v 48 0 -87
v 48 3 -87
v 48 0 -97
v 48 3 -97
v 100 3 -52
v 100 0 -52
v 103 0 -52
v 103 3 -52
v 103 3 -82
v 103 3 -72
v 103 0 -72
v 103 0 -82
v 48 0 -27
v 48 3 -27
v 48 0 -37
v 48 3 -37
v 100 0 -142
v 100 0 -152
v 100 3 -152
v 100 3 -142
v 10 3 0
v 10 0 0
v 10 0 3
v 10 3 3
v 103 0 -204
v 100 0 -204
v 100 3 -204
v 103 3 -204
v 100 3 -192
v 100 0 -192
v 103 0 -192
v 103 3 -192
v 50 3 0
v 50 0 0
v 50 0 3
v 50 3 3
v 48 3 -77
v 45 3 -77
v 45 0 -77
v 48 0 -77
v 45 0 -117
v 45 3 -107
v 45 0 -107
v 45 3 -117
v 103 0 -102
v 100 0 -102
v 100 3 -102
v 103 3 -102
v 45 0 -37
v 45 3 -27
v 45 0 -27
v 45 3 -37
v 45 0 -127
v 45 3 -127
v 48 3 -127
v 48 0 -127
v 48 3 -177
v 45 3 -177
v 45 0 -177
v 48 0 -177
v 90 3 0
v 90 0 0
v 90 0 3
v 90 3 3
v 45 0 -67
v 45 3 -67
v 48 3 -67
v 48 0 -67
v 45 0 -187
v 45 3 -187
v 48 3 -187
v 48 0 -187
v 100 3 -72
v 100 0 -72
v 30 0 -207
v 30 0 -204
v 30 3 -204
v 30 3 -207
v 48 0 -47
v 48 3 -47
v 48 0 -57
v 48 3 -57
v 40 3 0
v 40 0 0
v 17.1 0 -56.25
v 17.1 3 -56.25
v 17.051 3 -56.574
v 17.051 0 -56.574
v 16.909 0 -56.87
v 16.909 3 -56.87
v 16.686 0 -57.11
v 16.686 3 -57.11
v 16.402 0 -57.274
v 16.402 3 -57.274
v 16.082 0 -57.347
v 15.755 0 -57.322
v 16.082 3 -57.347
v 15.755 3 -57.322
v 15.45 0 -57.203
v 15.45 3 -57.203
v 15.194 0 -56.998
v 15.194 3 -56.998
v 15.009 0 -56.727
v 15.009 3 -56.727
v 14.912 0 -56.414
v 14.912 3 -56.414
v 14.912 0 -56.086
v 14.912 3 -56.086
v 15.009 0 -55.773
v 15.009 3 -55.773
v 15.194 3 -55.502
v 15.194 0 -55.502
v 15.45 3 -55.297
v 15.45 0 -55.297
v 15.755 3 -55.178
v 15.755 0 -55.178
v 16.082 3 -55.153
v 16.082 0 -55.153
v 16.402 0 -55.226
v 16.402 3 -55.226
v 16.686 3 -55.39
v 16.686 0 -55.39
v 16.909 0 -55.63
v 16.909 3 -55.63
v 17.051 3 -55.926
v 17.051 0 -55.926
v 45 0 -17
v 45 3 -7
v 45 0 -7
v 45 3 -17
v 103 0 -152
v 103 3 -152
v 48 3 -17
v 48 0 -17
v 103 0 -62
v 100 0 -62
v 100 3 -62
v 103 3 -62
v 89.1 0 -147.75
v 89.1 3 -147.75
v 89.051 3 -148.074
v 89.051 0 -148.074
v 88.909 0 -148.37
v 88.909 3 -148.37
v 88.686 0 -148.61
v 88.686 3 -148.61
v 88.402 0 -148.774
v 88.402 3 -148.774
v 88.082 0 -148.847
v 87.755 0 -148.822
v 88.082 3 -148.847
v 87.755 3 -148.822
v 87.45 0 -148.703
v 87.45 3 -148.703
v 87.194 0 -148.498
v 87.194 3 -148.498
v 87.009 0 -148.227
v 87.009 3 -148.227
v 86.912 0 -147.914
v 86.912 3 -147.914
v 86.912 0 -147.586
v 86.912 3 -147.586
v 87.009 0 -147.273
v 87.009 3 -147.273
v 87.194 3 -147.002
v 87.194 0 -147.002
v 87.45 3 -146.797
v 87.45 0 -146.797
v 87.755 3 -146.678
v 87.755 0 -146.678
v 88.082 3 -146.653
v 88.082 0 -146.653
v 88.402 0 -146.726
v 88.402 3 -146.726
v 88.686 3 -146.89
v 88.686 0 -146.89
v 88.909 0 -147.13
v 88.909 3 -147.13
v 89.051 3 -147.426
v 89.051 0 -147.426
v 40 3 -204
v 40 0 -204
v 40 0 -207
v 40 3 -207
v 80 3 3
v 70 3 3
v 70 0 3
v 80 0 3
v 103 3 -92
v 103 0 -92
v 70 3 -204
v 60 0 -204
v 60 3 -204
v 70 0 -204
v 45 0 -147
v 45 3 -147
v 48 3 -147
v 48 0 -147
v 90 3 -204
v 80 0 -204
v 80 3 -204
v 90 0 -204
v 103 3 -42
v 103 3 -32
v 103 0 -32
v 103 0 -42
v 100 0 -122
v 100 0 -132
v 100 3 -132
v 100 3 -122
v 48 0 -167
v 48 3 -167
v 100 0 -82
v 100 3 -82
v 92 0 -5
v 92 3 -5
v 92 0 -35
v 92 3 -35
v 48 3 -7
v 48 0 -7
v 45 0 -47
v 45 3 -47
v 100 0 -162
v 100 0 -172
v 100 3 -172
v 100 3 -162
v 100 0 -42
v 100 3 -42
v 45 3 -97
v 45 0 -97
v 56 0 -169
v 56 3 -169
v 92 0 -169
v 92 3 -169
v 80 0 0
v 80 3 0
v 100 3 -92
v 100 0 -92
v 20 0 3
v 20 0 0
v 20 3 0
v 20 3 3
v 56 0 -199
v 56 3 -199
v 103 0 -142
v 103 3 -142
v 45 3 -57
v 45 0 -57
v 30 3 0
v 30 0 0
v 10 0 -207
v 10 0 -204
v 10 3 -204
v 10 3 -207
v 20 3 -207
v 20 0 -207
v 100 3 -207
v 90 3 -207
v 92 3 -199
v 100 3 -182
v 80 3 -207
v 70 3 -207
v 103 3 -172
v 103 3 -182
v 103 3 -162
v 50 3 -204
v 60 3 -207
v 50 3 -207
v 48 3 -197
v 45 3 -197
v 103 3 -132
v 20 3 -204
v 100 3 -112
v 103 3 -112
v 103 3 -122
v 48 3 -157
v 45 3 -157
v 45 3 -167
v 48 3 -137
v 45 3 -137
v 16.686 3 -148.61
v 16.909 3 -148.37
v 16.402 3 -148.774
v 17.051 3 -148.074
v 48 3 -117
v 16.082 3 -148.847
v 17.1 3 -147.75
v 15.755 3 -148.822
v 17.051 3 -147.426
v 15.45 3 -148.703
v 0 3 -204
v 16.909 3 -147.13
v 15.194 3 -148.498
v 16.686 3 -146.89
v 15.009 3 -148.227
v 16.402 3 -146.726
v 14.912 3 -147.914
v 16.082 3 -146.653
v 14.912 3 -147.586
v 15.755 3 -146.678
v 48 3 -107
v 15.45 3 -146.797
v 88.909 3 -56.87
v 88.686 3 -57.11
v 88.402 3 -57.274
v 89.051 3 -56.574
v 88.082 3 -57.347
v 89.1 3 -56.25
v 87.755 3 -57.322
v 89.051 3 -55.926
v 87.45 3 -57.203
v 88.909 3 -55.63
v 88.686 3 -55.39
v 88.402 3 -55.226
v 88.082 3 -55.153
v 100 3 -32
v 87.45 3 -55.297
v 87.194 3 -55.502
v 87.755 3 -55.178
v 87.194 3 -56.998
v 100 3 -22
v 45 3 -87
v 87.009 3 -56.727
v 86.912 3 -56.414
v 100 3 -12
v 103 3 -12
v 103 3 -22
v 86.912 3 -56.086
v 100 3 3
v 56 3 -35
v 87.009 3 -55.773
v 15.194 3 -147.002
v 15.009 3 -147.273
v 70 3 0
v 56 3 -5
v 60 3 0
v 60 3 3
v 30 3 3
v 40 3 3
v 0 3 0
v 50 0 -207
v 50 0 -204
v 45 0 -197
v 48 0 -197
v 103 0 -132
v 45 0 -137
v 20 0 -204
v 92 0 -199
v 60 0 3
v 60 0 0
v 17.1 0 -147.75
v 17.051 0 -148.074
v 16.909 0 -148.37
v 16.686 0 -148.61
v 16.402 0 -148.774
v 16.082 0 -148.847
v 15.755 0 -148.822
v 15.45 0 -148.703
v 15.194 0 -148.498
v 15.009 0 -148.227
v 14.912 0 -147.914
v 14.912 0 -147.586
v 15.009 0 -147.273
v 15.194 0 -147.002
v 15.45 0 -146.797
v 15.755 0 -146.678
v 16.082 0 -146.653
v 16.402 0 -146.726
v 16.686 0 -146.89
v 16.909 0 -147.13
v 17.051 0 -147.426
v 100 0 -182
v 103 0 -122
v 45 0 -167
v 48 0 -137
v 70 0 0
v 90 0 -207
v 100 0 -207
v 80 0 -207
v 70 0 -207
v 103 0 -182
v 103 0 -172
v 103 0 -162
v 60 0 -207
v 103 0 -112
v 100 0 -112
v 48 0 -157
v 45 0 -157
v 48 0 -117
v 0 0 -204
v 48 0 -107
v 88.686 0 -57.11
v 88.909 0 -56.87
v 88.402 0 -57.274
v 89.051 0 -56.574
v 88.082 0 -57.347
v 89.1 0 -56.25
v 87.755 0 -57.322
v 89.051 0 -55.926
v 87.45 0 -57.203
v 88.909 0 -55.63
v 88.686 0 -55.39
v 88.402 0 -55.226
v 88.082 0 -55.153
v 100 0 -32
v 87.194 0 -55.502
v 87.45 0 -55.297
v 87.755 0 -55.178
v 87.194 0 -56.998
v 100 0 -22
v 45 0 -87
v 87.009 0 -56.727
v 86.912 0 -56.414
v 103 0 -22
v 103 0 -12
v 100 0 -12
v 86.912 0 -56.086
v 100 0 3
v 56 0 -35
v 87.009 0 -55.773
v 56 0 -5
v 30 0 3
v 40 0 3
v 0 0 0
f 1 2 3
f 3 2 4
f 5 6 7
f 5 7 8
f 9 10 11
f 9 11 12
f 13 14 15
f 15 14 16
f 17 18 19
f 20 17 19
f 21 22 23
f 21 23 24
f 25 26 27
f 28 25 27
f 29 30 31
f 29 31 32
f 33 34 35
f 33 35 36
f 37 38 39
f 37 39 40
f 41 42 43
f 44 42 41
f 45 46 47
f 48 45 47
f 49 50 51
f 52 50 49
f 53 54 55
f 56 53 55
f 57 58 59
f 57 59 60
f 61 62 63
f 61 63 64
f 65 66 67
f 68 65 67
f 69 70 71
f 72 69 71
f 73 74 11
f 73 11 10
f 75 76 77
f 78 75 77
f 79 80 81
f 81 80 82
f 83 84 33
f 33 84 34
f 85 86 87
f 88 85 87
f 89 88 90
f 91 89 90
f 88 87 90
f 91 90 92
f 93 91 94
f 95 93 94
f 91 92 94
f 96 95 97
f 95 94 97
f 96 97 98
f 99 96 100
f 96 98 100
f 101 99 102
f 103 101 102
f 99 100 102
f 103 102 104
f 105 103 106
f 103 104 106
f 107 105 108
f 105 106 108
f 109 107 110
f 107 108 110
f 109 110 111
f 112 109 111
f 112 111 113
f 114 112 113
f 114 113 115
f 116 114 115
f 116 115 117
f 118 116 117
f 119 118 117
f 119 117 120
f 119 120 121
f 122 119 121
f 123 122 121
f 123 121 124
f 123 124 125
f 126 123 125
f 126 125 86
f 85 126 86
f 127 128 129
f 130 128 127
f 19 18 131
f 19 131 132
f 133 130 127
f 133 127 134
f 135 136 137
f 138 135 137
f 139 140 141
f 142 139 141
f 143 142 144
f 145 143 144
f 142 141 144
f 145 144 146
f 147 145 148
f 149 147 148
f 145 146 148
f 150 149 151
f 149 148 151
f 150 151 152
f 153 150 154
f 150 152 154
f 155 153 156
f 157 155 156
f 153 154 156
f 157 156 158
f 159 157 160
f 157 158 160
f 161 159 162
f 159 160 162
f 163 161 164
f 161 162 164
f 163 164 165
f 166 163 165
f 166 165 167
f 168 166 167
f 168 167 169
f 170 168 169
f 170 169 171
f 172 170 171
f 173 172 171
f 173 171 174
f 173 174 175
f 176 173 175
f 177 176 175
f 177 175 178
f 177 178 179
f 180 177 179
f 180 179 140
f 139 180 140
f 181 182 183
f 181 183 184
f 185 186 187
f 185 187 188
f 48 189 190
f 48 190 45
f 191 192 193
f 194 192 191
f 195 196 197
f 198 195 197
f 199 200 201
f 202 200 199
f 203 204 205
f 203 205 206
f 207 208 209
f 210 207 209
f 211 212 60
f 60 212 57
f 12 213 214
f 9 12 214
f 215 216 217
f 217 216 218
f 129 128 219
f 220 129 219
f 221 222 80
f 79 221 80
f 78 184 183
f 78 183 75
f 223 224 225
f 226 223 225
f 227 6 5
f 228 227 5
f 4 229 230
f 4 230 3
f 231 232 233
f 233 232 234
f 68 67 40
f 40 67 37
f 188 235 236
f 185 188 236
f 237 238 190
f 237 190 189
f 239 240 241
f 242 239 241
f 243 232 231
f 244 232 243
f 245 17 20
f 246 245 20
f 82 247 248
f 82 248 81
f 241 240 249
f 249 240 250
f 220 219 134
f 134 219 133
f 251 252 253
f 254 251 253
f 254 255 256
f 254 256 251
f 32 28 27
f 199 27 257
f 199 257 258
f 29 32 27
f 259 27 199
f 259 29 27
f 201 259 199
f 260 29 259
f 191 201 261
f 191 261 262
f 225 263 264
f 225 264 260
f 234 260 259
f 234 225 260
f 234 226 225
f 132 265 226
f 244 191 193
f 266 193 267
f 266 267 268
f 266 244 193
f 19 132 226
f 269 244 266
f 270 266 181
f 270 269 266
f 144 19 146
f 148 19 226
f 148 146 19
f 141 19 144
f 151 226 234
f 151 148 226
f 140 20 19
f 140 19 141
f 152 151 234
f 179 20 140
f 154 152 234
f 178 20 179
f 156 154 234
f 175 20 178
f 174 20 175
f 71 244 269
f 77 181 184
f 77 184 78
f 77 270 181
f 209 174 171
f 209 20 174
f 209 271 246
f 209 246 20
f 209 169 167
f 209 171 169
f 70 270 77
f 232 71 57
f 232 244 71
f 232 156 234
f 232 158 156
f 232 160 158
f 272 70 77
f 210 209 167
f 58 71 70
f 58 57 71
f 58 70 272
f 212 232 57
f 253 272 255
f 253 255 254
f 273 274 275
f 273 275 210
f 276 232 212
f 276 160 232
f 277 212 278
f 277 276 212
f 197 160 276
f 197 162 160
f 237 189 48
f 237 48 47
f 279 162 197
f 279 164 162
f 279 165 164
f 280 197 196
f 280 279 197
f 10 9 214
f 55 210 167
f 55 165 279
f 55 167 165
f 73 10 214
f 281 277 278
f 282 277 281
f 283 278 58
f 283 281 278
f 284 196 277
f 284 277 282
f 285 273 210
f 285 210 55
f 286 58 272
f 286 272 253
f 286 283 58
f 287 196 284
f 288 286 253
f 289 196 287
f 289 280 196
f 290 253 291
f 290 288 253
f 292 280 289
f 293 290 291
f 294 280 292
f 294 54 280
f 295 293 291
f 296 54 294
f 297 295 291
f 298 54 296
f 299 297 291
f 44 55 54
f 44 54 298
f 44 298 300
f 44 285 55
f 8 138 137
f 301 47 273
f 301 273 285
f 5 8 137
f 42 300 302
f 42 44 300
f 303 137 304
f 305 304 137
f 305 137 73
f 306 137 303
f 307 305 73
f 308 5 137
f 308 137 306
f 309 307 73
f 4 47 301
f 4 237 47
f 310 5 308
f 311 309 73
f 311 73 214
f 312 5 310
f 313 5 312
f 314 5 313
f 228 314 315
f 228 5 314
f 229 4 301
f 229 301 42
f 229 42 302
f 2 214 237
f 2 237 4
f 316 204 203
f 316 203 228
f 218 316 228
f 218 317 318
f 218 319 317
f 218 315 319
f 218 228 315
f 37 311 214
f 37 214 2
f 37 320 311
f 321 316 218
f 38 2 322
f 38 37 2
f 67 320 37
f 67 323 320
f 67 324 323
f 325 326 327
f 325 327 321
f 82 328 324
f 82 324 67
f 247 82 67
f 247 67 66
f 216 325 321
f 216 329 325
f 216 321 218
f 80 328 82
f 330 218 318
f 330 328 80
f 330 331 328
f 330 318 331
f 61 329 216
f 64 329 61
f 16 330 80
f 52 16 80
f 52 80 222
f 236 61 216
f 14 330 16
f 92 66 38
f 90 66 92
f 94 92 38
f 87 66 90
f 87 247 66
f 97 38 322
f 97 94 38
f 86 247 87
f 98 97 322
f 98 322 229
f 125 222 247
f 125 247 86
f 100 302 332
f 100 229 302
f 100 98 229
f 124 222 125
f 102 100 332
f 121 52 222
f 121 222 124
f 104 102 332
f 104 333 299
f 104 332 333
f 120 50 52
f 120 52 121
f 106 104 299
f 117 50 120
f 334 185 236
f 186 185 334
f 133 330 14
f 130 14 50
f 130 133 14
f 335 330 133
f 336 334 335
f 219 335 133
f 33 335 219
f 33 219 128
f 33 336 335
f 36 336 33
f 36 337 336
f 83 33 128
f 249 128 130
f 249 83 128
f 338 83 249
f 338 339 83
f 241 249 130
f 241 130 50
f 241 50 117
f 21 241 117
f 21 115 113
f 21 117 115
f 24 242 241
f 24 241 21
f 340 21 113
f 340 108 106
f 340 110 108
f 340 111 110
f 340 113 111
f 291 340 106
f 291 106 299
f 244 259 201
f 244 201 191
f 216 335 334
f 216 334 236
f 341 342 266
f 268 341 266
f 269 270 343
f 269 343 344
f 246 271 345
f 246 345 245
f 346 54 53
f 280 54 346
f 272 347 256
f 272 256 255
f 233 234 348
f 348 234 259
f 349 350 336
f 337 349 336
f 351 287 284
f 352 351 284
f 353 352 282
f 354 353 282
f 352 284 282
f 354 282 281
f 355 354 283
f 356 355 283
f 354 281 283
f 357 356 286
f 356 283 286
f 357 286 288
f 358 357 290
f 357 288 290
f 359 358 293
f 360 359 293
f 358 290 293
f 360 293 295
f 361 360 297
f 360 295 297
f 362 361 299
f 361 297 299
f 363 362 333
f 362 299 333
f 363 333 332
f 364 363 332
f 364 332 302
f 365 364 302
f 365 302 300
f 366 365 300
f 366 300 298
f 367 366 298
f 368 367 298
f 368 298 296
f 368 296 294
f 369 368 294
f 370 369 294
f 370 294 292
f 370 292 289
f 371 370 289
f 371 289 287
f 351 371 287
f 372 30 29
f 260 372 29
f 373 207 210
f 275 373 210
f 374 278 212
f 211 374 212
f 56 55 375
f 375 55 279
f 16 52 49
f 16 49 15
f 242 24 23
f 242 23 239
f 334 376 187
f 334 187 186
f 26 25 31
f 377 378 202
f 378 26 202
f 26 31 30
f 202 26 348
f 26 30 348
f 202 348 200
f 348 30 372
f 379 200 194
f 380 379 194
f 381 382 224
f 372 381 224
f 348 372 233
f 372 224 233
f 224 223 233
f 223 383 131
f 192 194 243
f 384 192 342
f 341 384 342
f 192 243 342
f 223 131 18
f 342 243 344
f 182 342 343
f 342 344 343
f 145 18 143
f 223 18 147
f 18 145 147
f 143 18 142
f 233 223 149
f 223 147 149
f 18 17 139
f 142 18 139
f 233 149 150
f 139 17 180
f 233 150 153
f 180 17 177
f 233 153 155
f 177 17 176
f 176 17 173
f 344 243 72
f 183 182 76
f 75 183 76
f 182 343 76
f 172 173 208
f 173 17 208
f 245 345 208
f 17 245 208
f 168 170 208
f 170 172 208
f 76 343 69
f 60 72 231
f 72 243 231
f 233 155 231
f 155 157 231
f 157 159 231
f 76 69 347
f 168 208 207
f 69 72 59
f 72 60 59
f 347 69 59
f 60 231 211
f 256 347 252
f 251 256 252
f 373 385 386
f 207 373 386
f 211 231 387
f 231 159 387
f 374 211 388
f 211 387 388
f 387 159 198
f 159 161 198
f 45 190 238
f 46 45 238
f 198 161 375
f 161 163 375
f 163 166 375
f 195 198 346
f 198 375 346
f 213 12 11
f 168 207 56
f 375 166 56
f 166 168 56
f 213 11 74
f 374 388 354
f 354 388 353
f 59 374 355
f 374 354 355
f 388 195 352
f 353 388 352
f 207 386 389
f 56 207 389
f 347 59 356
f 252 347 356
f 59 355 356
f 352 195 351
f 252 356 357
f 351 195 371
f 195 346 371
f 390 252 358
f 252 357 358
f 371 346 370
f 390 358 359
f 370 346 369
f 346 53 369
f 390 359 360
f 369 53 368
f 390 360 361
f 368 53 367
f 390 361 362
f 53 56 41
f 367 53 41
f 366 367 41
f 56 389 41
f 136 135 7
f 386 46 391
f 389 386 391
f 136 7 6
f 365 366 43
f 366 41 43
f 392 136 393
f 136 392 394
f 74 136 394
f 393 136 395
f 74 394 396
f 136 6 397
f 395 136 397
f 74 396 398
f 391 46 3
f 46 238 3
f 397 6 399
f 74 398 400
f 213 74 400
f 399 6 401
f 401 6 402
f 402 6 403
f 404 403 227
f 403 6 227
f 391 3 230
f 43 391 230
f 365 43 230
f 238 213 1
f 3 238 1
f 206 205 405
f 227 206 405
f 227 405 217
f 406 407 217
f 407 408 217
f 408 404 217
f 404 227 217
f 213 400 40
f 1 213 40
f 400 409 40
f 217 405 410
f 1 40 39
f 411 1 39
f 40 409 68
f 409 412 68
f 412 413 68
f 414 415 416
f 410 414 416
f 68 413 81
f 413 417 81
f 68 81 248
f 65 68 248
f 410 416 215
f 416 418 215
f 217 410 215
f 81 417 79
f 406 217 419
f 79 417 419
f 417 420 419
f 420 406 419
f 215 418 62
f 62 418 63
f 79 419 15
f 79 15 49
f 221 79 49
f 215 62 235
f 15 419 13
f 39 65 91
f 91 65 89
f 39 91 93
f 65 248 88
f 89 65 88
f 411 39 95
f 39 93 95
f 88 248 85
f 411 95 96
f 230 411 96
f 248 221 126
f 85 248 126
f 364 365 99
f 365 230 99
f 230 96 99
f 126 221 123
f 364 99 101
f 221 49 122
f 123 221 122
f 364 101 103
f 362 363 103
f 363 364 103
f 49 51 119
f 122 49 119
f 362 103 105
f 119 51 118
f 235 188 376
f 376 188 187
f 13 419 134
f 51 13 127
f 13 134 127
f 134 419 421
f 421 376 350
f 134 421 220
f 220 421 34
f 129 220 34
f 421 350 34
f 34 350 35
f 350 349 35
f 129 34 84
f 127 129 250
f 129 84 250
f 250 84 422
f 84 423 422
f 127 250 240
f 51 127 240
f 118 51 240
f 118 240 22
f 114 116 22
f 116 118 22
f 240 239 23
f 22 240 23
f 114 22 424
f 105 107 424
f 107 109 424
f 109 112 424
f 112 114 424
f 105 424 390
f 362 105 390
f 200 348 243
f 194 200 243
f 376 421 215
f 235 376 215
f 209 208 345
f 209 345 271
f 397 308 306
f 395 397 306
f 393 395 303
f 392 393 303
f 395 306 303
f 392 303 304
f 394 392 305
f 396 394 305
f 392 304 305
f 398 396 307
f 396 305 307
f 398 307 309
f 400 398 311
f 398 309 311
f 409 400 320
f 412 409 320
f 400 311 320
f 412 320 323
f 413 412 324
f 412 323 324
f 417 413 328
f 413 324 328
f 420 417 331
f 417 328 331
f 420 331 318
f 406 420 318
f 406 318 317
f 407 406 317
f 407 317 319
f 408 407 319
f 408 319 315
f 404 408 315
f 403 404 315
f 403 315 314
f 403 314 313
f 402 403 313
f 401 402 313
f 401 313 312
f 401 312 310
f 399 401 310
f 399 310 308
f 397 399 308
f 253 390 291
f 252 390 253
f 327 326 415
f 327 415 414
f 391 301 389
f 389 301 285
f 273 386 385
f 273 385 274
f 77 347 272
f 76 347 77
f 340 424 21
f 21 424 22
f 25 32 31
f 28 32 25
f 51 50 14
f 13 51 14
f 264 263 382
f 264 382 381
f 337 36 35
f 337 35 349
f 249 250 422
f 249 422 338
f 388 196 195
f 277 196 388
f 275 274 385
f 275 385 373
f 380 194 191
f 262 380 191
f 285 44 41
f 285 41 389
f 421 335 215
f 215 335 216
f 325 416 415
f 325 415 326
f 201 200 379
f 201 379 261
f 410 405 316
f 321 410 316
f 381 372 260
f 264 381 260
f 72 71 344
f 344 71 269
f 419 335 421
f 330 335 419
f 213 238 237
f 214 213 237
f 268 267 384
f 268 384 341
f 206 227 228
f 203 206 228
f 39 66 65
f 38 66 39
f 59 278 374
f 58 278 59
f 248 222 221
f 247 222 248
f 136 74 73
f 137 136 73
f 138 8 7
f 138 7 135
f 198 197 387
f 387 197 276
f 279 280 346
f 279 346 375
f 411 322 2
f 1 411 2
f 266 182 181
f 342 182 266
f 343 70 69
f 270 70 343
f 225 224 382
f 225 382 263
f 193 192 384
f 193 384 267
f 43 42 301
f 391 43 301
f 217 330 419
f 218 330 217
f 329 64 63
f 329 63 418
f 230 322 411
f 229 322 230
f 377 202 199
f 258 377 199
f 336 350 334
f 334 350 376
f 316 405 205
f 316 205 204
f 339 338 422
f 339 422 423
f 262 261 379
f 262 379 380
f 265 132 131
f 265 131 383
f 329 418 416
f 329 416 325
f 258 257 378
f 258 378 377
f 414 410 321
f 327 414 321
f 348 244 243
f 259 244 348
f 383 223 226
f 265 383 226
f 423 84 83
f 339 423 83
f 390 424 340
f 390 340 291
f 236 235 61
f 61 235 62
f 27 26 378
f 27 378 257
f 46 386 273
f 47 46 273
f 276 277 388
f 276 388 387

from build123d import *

# Parameters (mm, degrees)
SKETCH1_W           = 100
SKETCH1_H           = 204
BOSS_EXTRUDE1_DEPTH = 3
SKETCH2_W           = 10
SKETCH2_H           = 3
BOSS_EXTRUDE2_DEPTH = 3
LPATTERN1_COUNT     = 5
LPATTERN1_PITCH     = 20
SKETCH3_W           = 10
SKETCH3_H           = 3
BOSS_EXTRUDE3_DEPTH = 3
LPATTERN2_COUNT     = 5
LPATTERN2_PITCH     = 20
SKETCH4_W           = 3
SKETCH4_H           = 10
CUT_EXTRUDE1_DEPTH  = 4
LPATTERN3_COUNT     = 10
LPATTERN3_PITCH     = 20
SKETCH5_R           = 1.1
SKETCH5_W           = 36
SKETCH5_H           = 30
CUT_EXTRUDE2_DEPTH  = 4
SKETCH6_W           = 12
SKETCH6_H           = 3
SKETCH6_W_2         = 10
BOSS_EXTRUDE4_DEPTH = 3


with BuildPart() as part:
    # Sketch1 → Boss-Extrude1 (new body)
    with BuildSketch(Plane(origin=(0, 0, 0), x_dir=(1, 0, 0), z_dir=(0, 1, 0))):
        with Locations((50, 102)):
            Rectangle(SKETCH1_W, SKETCH1_H)
    extrude(amount=BOSS_EXTRUDE1_DEPTH)

    # Sketch2 → Boss-Extrude2 (add)
    with BuildSketch(Plane.XY):
        with Locations((95, 1.5)):
            Rectangle(SKETCH2_W, SKETCH2_H)
    boss_extrude2 = extrude(amount=BOSS_EXTRUDE2_DEPTH)

    # LPattern1: Boss-Extrude2 ×5
    with Locations(*[(-i * LPATTERN1_PITCH, 0, 0) for i in range(1, LPATTERN1_COUNT)]):
        add(boss_extrude2)

    # Sketch3 → Boss-Extrude3 (add)
    with BuildSketch(Plane(origin=(0, 0, -204), x_dir=(-1, 0, 0), z_dir=(0, 0, -1))):
        with Locations((-95, 1.5)):
            Rectangle(SKETCH3_W, SKETCH3_H)
    boss_extrude3 = extrude(amount=BOSS_EXTRUDE3_DEPTH)

    # LPattern2: Boss-Extrude3 ×5
    with Locations(*[(-i * LPATTERN2_PITCH, 0, 0) for i in range(1, LPATTERN2_COUNT)]):
        add(boss_extrude3)

    # Sketch4 → Cut-Extrude1 (cut, through all)
    with BuildSketch(Plane(origin=(0, 3, 0), x_dir=(1, 0, 0), z_dir=(0, 1, 0))):
        with Locations((46.5, 12)):
            Rectangle(SKETCH4_W, SKETCH4_H)
    cut_extrude1 = extrude(amount=-CUT_EXTRUDE1_DEPTH, mode=Mode.SUBTRACT)

    # LPattern3: Cut-Extrude1 ×10
    with Locations(*[(0, 0, -i * LPATTERN3_PITCH) for i in range(1, LPATTERN3_COUNT)]):
        add(cut_extrude1, mode=Mode.SUBTRACT)

    # Sketch5 → Cut-Extrude2 (cut, through all)
    with BuildSketch(Plane(origin=(0, 3, 0), x_dir=(1, 0, 0), z_dir=(0, 1, 0))):
        with Locations((88, 147.75)):
            Circle(SKETCH5_R)
        with Locations((88, 56.25)):
            Circle(SKETCH5_R)
        with Locations((16, 56.25)):
            Circle(SKETCH5_R)
        with Locations((16, 147.75)):
            Circle(SKETCH5_R)
        with Locations((74, 20)):
            Rectangle(SKETCH5_W, SKETCH5_H)
        with Locations((74, 184)):
            Rectangle(SKETCH5_W, SKETCH5_H)
    extrude(amount=-CUT_EXTRUDE2_DEPTH, mode=Mode.SUBTRACT)

    # Sketch6 → Boss-Extrude4 (add)
    with BuildSketch(Plane(origin=(100, 0, 0), x_dir=(0, 0, -1), z_dir=(1, 0, 0))):
        with Locations((198, 1.5)):
            Rectangle(SKETCH6_W, SKETCH6_H)
        with Locations((157, 1.5)):
            Rectangle(SKETCH6_W_2, SKETCH6_H)
        with Locations((177, 1.5)):
            Rectangle(SKETCH6_W_2, SKETCH6_H)
        with Locations((137, 1.5)):
            Rectangle(SKETCH6_W_2, SKETCH6_H)
        with Locations((117, 1.5)):
            Rectangle(SKETCH6_W_2, SKETCH6_H)
        with Locations((97, 1.5)):
            Rectangle(SKETCH6_W_2, SKETCH6_H)
        with Locations((77, 1.5)):
            Rectangle(SKETCH6_W_2, SKETCH6_H)
        with Locations((57, 1.5)):
            Rectangle(SKETCH6_W_2, SKETCH6_H)
        with Locations((37, 1.5)):
            Rectangle(SKETCH6_W_2, SKETCH6_H)
        with Locations((17, 1.5)):
            Rectangle(SKETCH6_W_2, SKETCH6_H)
    extrude(amount=BOSS_EXTRUDE4_DEPTH)


solid = part.part
